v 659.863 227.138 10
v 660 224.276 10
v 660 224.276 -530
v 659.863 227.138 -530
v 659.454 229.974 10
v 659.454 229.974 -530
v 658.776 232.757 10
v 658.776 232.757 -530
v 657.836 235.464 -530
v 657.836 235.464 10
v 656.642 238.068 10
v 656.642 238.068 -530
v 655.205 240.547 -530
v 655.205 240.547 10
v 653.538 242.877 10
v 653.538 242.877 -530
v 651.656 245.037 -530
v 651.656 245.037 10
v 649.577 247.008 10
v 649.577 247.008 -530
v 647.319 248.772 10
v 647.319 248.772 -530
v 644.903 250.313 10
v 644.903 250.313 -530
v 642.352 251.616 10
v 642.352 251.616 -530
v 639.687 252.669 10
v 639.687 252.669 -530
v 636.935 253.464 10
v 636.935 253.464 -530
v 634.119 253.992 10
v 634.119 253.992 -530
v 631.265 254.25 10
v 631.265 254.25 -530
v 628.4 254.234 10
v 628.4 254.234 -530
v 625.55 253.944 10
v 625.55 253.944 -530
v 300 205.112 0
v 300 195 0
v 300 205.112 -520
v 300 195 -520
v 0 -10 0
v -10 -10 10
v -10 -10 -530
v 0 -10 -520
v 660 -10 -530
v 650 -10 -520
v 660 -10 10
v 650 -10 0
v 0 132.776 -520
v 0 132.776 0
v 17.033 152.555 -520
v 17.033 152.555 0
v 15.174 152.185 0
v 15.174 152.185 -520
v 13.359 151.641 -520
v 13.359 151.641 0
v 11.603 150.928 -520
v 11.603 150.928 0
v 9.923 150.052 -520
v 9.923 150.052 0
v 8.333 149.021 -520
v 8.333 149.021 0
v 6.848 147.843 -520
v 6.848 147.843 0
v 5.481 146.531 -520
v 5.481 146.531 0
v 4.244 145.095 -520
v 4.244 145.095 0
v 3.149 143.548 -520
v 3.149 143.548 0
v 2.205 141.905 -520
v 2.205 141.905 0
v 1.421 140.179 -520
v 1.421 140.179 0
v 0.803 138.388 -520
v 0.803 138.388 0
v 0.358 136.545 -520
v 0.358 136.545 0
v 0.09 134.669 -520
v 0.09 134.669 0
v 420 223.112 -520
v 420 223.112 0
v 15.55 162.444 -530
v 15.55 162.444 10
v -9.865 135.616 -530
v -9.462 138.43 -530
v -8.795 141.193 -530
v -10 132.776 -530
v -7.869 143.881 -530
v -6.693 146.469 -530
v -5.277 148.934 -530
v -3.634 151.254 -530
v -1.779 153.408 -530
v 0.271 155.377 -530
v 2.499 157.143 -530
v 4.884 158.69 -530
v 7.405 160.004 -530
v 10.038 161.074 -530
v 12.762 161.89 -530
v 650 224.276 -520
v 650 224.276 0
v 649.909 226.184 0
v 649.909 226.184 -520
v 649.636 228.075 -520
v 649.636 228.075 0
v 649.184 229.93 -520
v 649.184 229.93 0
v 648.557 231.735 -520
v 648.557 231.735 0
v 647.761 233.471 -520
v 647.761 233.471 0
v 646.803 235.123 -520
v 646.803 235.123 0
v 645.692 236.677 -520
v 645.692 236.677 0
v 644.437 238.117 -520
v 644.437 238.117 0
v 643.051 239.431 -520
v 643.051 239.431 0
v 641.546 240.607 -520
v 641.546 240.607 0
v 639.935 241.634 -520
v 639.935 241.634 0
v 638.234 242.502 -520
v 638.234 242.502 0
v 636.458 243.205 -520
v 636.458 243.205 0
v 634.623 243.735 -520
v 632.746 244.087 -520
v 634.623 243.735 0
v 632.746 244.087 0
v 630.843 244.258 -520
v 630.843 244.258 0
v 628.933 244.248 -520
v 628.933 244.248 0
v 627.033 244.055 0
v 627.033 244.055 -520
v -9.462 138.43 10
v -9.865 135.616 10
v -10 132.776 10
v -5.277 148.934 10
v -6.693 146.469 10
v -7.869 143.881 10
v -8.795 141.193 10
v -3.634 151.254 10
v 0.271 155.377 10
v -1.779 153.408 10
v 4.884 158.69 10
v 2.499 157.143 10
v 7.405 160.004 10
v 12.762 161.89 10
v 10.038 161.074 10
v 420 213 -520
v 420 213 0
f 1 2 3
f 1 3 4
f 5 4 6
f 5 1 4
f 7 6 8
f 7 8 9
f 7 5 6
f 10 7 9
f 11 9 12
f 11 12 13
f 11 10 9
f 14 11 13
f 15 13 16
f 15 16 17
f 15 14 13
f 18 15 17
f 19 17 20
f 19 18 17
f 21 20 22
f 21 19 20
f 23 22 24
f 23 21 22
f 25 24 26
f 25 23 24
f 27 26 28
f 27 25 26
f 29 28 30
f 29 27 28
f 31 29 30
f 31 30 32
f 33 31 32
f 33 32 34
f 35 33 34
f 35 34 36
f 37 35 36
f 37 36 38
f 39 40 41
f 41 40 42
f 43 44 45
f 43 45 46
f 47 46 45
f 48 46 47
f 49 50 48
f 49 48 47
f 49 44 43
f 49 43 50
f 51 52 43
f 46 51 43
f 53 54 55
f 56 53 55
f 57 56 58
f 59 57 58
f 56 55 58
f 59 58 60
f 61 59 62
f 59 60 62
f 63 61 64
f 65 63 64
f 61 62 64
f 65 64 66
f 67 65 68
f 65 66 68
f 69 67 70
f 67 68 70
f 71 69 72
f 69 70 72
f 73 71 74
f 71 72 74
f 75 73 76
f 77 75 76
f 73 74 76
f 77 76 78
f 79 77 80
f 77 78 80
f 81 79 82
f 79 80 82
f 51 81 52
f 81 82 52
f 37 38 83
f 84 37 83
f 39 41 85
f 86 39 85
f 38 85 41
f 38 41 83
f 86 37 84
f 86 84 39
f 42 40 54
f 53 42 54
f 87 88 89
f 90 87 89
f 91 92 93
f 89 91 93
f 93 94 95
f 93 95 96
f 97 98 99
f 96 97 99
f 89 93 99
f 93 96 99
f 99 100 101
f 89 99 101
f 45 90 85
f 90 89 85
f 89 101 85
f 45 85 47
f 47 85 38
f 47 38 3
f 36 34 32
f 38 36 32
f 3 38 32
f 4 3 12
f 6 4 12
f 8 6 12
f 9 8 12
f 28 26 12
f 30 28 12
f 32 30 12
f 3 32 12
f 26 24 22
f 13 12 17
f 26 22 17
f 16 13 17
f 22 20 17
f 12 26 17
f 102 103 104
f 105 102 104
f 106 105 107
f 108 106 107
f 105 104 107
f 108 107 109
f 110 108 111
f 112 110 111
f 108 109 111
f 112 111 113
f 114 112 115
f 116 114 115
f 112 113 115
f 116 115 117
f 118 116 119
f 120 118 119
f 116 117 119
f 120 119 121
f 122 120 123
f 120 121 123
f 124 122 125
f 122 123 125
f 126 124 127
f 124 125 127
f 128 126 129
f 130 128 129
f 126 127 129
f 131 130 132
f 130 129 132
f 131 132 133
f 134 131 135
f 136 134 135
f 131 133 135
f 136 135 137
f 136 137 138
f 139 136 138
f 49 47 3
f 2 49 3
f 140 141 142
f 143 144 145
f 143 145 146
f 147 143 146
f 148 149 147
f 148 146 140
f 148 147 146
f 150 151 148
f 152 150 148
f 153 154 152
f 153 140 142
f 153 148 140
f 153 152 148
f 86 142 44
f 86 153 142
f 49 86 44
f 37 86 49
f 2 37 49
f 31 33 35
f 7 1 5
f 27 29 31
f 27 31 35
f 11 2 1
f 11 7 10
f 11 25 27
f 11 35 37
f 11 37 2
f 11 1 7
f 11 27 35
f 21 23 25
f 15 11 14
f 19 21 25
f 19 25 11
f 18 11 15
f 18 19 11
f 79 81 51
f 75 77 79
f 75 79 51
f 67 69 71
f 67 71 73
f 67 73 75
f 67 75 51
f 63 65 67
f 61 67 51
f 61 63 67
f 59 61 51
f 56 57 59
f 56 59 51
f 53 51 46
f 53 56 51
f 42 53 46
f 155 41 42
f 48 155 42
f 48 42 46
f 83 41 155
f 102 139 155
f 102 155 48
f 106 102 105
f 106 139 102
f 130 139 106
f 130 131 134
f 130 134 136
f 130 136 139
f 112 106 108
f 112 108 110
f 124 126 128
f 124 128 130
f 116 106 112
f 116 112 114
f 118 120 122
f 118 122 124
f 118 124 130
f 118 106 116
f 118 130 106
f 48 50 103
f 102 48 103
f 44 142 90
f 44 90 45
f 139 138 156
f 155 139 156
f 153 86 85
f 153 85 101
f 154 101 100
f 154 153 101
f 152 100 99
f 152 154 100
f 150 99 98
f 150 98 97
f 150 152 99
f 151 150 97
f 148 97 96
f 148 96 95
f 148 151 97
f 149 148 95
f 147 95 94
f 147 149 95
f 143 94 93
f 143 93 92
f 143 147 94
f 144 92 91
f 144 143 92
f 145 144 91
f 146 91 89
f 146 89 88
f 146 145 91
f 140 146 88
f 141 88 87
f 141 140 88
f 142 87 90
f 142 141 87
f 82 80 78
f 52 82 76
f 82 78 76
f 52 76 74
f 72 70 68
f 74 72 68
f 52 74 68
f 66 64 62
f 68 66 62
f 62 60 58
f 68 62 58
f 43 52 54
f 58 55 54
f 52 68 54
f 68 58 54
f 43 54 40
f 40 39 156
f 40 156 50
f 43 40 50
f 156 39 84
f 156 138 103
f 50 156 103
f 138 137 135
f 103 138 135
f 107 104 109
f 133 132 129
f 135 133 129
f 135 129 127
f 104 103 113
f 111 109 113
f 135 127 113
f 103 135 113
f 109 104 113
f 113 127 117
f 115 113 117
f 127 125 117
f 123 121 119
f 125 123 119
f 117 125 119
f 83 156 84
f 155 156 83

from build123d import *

# Parameters (mm, degrees)
BOSS_EXTRUDE1_DEPTH = 530
CUT_EXTRUDE1_DEPTH  = 520
BOSS_EXTRUDE2_START = 10
BOSS_EXTRUDE2_DEPTH = 10
SKETCH4_W           = 120
SKETCH4_H           = 520
CUT_EXTRUDE2_DEPTH  = 313


with BuildPart() as part:
    # Sketch2 → Boss-Extrude1 (new body)
    with BuildSketch(Plane.XY):
        with BuildLine():
            Line((660, -10), (660, 224.276251584))
            ThreePointArc((660, 224.276251584), (649.576690123, 247.008457896), (625.549786412, 253.94434217))
            Line((625.549786412, 253.94434217), (15.549786412, 162.44434217))
            ThreePointArc((15.549786412, 162.44434217), (-2.732206312, 152.352941707), (-10, 132.776251584))
            Line((-10, 132.776251584), (-10, -10))
            Line((-10, -10), (660, -10))
        make_face()
    extrude(amount=-BOSS_EXTRUDE1_DEPTH)

    # Sketch2<3> → Cut-Extrude1 (cut)
    with BuildSketch(Plane.XY):
        with BuildLine():
            Line((650, -10), (650, 0))
            Line((650, 0), (650, 224.276251584))
            ThreePointArc((650, 224.276251584), (643.051126749, 239.431055792), (627.033190941, 244.054978641))
            Line((627.033190941, 244.054978641), (17.033190941, 152.554978641))
            ThreePointArc((17.033190941, 152.554978641), (4.845195792, 145.827378333), (0, 132.776251584))
            Line((0, 132.776251584), (0, 0))
            Line((0, 0), (0, -10))
            Line((0, -10), (650, -10))
        make_face()
    extrude(amount=-CUT_EXTRUDE1_DEPTH, mode=Mode.SUBTRACT)

    # Sketch2<4> → Boss-Extrude2 (add)
    with BuildSketch(Plane.XY.offset(BOSS_EXTRUDE2_START)):
        with BuildLine():
            Line((660, -10), (660, 224.276251584))
            ThreePointArc((660, 224.276251584), (649.576690123, 247.008457896), (625.549786412, 253.94434217))
            Line((625.549786412, 253.94434217), (15.549786412, 162.44434217))
            ThreePointArc((15.549786412, 162.44434217), (-2.732206312, 152.352941707), (-10, 132.776251584))
            Line((-10, 132.776251584), (-10, -10))
            Line((-10, -10), (660, -10))
        make_face()
    extrude(amount=-BOSS_EXTRUDE2_DEPTH)

    # Sketch4 → Cut-Extrude2 (cut)
    with BuildSketch(Plane(origin=(0, 0, 0), x_dir=(1, 0, 0), z_dir=(0, 1, 0))):
        with Locations((360, 260)):
            Rectangle(SKETCH4_W, SKETCH4_H)
    extrude(amount=CUT_EXTRUDE2_DEPTH, mode=Mode.SUBTRACT)


solid = part.part
